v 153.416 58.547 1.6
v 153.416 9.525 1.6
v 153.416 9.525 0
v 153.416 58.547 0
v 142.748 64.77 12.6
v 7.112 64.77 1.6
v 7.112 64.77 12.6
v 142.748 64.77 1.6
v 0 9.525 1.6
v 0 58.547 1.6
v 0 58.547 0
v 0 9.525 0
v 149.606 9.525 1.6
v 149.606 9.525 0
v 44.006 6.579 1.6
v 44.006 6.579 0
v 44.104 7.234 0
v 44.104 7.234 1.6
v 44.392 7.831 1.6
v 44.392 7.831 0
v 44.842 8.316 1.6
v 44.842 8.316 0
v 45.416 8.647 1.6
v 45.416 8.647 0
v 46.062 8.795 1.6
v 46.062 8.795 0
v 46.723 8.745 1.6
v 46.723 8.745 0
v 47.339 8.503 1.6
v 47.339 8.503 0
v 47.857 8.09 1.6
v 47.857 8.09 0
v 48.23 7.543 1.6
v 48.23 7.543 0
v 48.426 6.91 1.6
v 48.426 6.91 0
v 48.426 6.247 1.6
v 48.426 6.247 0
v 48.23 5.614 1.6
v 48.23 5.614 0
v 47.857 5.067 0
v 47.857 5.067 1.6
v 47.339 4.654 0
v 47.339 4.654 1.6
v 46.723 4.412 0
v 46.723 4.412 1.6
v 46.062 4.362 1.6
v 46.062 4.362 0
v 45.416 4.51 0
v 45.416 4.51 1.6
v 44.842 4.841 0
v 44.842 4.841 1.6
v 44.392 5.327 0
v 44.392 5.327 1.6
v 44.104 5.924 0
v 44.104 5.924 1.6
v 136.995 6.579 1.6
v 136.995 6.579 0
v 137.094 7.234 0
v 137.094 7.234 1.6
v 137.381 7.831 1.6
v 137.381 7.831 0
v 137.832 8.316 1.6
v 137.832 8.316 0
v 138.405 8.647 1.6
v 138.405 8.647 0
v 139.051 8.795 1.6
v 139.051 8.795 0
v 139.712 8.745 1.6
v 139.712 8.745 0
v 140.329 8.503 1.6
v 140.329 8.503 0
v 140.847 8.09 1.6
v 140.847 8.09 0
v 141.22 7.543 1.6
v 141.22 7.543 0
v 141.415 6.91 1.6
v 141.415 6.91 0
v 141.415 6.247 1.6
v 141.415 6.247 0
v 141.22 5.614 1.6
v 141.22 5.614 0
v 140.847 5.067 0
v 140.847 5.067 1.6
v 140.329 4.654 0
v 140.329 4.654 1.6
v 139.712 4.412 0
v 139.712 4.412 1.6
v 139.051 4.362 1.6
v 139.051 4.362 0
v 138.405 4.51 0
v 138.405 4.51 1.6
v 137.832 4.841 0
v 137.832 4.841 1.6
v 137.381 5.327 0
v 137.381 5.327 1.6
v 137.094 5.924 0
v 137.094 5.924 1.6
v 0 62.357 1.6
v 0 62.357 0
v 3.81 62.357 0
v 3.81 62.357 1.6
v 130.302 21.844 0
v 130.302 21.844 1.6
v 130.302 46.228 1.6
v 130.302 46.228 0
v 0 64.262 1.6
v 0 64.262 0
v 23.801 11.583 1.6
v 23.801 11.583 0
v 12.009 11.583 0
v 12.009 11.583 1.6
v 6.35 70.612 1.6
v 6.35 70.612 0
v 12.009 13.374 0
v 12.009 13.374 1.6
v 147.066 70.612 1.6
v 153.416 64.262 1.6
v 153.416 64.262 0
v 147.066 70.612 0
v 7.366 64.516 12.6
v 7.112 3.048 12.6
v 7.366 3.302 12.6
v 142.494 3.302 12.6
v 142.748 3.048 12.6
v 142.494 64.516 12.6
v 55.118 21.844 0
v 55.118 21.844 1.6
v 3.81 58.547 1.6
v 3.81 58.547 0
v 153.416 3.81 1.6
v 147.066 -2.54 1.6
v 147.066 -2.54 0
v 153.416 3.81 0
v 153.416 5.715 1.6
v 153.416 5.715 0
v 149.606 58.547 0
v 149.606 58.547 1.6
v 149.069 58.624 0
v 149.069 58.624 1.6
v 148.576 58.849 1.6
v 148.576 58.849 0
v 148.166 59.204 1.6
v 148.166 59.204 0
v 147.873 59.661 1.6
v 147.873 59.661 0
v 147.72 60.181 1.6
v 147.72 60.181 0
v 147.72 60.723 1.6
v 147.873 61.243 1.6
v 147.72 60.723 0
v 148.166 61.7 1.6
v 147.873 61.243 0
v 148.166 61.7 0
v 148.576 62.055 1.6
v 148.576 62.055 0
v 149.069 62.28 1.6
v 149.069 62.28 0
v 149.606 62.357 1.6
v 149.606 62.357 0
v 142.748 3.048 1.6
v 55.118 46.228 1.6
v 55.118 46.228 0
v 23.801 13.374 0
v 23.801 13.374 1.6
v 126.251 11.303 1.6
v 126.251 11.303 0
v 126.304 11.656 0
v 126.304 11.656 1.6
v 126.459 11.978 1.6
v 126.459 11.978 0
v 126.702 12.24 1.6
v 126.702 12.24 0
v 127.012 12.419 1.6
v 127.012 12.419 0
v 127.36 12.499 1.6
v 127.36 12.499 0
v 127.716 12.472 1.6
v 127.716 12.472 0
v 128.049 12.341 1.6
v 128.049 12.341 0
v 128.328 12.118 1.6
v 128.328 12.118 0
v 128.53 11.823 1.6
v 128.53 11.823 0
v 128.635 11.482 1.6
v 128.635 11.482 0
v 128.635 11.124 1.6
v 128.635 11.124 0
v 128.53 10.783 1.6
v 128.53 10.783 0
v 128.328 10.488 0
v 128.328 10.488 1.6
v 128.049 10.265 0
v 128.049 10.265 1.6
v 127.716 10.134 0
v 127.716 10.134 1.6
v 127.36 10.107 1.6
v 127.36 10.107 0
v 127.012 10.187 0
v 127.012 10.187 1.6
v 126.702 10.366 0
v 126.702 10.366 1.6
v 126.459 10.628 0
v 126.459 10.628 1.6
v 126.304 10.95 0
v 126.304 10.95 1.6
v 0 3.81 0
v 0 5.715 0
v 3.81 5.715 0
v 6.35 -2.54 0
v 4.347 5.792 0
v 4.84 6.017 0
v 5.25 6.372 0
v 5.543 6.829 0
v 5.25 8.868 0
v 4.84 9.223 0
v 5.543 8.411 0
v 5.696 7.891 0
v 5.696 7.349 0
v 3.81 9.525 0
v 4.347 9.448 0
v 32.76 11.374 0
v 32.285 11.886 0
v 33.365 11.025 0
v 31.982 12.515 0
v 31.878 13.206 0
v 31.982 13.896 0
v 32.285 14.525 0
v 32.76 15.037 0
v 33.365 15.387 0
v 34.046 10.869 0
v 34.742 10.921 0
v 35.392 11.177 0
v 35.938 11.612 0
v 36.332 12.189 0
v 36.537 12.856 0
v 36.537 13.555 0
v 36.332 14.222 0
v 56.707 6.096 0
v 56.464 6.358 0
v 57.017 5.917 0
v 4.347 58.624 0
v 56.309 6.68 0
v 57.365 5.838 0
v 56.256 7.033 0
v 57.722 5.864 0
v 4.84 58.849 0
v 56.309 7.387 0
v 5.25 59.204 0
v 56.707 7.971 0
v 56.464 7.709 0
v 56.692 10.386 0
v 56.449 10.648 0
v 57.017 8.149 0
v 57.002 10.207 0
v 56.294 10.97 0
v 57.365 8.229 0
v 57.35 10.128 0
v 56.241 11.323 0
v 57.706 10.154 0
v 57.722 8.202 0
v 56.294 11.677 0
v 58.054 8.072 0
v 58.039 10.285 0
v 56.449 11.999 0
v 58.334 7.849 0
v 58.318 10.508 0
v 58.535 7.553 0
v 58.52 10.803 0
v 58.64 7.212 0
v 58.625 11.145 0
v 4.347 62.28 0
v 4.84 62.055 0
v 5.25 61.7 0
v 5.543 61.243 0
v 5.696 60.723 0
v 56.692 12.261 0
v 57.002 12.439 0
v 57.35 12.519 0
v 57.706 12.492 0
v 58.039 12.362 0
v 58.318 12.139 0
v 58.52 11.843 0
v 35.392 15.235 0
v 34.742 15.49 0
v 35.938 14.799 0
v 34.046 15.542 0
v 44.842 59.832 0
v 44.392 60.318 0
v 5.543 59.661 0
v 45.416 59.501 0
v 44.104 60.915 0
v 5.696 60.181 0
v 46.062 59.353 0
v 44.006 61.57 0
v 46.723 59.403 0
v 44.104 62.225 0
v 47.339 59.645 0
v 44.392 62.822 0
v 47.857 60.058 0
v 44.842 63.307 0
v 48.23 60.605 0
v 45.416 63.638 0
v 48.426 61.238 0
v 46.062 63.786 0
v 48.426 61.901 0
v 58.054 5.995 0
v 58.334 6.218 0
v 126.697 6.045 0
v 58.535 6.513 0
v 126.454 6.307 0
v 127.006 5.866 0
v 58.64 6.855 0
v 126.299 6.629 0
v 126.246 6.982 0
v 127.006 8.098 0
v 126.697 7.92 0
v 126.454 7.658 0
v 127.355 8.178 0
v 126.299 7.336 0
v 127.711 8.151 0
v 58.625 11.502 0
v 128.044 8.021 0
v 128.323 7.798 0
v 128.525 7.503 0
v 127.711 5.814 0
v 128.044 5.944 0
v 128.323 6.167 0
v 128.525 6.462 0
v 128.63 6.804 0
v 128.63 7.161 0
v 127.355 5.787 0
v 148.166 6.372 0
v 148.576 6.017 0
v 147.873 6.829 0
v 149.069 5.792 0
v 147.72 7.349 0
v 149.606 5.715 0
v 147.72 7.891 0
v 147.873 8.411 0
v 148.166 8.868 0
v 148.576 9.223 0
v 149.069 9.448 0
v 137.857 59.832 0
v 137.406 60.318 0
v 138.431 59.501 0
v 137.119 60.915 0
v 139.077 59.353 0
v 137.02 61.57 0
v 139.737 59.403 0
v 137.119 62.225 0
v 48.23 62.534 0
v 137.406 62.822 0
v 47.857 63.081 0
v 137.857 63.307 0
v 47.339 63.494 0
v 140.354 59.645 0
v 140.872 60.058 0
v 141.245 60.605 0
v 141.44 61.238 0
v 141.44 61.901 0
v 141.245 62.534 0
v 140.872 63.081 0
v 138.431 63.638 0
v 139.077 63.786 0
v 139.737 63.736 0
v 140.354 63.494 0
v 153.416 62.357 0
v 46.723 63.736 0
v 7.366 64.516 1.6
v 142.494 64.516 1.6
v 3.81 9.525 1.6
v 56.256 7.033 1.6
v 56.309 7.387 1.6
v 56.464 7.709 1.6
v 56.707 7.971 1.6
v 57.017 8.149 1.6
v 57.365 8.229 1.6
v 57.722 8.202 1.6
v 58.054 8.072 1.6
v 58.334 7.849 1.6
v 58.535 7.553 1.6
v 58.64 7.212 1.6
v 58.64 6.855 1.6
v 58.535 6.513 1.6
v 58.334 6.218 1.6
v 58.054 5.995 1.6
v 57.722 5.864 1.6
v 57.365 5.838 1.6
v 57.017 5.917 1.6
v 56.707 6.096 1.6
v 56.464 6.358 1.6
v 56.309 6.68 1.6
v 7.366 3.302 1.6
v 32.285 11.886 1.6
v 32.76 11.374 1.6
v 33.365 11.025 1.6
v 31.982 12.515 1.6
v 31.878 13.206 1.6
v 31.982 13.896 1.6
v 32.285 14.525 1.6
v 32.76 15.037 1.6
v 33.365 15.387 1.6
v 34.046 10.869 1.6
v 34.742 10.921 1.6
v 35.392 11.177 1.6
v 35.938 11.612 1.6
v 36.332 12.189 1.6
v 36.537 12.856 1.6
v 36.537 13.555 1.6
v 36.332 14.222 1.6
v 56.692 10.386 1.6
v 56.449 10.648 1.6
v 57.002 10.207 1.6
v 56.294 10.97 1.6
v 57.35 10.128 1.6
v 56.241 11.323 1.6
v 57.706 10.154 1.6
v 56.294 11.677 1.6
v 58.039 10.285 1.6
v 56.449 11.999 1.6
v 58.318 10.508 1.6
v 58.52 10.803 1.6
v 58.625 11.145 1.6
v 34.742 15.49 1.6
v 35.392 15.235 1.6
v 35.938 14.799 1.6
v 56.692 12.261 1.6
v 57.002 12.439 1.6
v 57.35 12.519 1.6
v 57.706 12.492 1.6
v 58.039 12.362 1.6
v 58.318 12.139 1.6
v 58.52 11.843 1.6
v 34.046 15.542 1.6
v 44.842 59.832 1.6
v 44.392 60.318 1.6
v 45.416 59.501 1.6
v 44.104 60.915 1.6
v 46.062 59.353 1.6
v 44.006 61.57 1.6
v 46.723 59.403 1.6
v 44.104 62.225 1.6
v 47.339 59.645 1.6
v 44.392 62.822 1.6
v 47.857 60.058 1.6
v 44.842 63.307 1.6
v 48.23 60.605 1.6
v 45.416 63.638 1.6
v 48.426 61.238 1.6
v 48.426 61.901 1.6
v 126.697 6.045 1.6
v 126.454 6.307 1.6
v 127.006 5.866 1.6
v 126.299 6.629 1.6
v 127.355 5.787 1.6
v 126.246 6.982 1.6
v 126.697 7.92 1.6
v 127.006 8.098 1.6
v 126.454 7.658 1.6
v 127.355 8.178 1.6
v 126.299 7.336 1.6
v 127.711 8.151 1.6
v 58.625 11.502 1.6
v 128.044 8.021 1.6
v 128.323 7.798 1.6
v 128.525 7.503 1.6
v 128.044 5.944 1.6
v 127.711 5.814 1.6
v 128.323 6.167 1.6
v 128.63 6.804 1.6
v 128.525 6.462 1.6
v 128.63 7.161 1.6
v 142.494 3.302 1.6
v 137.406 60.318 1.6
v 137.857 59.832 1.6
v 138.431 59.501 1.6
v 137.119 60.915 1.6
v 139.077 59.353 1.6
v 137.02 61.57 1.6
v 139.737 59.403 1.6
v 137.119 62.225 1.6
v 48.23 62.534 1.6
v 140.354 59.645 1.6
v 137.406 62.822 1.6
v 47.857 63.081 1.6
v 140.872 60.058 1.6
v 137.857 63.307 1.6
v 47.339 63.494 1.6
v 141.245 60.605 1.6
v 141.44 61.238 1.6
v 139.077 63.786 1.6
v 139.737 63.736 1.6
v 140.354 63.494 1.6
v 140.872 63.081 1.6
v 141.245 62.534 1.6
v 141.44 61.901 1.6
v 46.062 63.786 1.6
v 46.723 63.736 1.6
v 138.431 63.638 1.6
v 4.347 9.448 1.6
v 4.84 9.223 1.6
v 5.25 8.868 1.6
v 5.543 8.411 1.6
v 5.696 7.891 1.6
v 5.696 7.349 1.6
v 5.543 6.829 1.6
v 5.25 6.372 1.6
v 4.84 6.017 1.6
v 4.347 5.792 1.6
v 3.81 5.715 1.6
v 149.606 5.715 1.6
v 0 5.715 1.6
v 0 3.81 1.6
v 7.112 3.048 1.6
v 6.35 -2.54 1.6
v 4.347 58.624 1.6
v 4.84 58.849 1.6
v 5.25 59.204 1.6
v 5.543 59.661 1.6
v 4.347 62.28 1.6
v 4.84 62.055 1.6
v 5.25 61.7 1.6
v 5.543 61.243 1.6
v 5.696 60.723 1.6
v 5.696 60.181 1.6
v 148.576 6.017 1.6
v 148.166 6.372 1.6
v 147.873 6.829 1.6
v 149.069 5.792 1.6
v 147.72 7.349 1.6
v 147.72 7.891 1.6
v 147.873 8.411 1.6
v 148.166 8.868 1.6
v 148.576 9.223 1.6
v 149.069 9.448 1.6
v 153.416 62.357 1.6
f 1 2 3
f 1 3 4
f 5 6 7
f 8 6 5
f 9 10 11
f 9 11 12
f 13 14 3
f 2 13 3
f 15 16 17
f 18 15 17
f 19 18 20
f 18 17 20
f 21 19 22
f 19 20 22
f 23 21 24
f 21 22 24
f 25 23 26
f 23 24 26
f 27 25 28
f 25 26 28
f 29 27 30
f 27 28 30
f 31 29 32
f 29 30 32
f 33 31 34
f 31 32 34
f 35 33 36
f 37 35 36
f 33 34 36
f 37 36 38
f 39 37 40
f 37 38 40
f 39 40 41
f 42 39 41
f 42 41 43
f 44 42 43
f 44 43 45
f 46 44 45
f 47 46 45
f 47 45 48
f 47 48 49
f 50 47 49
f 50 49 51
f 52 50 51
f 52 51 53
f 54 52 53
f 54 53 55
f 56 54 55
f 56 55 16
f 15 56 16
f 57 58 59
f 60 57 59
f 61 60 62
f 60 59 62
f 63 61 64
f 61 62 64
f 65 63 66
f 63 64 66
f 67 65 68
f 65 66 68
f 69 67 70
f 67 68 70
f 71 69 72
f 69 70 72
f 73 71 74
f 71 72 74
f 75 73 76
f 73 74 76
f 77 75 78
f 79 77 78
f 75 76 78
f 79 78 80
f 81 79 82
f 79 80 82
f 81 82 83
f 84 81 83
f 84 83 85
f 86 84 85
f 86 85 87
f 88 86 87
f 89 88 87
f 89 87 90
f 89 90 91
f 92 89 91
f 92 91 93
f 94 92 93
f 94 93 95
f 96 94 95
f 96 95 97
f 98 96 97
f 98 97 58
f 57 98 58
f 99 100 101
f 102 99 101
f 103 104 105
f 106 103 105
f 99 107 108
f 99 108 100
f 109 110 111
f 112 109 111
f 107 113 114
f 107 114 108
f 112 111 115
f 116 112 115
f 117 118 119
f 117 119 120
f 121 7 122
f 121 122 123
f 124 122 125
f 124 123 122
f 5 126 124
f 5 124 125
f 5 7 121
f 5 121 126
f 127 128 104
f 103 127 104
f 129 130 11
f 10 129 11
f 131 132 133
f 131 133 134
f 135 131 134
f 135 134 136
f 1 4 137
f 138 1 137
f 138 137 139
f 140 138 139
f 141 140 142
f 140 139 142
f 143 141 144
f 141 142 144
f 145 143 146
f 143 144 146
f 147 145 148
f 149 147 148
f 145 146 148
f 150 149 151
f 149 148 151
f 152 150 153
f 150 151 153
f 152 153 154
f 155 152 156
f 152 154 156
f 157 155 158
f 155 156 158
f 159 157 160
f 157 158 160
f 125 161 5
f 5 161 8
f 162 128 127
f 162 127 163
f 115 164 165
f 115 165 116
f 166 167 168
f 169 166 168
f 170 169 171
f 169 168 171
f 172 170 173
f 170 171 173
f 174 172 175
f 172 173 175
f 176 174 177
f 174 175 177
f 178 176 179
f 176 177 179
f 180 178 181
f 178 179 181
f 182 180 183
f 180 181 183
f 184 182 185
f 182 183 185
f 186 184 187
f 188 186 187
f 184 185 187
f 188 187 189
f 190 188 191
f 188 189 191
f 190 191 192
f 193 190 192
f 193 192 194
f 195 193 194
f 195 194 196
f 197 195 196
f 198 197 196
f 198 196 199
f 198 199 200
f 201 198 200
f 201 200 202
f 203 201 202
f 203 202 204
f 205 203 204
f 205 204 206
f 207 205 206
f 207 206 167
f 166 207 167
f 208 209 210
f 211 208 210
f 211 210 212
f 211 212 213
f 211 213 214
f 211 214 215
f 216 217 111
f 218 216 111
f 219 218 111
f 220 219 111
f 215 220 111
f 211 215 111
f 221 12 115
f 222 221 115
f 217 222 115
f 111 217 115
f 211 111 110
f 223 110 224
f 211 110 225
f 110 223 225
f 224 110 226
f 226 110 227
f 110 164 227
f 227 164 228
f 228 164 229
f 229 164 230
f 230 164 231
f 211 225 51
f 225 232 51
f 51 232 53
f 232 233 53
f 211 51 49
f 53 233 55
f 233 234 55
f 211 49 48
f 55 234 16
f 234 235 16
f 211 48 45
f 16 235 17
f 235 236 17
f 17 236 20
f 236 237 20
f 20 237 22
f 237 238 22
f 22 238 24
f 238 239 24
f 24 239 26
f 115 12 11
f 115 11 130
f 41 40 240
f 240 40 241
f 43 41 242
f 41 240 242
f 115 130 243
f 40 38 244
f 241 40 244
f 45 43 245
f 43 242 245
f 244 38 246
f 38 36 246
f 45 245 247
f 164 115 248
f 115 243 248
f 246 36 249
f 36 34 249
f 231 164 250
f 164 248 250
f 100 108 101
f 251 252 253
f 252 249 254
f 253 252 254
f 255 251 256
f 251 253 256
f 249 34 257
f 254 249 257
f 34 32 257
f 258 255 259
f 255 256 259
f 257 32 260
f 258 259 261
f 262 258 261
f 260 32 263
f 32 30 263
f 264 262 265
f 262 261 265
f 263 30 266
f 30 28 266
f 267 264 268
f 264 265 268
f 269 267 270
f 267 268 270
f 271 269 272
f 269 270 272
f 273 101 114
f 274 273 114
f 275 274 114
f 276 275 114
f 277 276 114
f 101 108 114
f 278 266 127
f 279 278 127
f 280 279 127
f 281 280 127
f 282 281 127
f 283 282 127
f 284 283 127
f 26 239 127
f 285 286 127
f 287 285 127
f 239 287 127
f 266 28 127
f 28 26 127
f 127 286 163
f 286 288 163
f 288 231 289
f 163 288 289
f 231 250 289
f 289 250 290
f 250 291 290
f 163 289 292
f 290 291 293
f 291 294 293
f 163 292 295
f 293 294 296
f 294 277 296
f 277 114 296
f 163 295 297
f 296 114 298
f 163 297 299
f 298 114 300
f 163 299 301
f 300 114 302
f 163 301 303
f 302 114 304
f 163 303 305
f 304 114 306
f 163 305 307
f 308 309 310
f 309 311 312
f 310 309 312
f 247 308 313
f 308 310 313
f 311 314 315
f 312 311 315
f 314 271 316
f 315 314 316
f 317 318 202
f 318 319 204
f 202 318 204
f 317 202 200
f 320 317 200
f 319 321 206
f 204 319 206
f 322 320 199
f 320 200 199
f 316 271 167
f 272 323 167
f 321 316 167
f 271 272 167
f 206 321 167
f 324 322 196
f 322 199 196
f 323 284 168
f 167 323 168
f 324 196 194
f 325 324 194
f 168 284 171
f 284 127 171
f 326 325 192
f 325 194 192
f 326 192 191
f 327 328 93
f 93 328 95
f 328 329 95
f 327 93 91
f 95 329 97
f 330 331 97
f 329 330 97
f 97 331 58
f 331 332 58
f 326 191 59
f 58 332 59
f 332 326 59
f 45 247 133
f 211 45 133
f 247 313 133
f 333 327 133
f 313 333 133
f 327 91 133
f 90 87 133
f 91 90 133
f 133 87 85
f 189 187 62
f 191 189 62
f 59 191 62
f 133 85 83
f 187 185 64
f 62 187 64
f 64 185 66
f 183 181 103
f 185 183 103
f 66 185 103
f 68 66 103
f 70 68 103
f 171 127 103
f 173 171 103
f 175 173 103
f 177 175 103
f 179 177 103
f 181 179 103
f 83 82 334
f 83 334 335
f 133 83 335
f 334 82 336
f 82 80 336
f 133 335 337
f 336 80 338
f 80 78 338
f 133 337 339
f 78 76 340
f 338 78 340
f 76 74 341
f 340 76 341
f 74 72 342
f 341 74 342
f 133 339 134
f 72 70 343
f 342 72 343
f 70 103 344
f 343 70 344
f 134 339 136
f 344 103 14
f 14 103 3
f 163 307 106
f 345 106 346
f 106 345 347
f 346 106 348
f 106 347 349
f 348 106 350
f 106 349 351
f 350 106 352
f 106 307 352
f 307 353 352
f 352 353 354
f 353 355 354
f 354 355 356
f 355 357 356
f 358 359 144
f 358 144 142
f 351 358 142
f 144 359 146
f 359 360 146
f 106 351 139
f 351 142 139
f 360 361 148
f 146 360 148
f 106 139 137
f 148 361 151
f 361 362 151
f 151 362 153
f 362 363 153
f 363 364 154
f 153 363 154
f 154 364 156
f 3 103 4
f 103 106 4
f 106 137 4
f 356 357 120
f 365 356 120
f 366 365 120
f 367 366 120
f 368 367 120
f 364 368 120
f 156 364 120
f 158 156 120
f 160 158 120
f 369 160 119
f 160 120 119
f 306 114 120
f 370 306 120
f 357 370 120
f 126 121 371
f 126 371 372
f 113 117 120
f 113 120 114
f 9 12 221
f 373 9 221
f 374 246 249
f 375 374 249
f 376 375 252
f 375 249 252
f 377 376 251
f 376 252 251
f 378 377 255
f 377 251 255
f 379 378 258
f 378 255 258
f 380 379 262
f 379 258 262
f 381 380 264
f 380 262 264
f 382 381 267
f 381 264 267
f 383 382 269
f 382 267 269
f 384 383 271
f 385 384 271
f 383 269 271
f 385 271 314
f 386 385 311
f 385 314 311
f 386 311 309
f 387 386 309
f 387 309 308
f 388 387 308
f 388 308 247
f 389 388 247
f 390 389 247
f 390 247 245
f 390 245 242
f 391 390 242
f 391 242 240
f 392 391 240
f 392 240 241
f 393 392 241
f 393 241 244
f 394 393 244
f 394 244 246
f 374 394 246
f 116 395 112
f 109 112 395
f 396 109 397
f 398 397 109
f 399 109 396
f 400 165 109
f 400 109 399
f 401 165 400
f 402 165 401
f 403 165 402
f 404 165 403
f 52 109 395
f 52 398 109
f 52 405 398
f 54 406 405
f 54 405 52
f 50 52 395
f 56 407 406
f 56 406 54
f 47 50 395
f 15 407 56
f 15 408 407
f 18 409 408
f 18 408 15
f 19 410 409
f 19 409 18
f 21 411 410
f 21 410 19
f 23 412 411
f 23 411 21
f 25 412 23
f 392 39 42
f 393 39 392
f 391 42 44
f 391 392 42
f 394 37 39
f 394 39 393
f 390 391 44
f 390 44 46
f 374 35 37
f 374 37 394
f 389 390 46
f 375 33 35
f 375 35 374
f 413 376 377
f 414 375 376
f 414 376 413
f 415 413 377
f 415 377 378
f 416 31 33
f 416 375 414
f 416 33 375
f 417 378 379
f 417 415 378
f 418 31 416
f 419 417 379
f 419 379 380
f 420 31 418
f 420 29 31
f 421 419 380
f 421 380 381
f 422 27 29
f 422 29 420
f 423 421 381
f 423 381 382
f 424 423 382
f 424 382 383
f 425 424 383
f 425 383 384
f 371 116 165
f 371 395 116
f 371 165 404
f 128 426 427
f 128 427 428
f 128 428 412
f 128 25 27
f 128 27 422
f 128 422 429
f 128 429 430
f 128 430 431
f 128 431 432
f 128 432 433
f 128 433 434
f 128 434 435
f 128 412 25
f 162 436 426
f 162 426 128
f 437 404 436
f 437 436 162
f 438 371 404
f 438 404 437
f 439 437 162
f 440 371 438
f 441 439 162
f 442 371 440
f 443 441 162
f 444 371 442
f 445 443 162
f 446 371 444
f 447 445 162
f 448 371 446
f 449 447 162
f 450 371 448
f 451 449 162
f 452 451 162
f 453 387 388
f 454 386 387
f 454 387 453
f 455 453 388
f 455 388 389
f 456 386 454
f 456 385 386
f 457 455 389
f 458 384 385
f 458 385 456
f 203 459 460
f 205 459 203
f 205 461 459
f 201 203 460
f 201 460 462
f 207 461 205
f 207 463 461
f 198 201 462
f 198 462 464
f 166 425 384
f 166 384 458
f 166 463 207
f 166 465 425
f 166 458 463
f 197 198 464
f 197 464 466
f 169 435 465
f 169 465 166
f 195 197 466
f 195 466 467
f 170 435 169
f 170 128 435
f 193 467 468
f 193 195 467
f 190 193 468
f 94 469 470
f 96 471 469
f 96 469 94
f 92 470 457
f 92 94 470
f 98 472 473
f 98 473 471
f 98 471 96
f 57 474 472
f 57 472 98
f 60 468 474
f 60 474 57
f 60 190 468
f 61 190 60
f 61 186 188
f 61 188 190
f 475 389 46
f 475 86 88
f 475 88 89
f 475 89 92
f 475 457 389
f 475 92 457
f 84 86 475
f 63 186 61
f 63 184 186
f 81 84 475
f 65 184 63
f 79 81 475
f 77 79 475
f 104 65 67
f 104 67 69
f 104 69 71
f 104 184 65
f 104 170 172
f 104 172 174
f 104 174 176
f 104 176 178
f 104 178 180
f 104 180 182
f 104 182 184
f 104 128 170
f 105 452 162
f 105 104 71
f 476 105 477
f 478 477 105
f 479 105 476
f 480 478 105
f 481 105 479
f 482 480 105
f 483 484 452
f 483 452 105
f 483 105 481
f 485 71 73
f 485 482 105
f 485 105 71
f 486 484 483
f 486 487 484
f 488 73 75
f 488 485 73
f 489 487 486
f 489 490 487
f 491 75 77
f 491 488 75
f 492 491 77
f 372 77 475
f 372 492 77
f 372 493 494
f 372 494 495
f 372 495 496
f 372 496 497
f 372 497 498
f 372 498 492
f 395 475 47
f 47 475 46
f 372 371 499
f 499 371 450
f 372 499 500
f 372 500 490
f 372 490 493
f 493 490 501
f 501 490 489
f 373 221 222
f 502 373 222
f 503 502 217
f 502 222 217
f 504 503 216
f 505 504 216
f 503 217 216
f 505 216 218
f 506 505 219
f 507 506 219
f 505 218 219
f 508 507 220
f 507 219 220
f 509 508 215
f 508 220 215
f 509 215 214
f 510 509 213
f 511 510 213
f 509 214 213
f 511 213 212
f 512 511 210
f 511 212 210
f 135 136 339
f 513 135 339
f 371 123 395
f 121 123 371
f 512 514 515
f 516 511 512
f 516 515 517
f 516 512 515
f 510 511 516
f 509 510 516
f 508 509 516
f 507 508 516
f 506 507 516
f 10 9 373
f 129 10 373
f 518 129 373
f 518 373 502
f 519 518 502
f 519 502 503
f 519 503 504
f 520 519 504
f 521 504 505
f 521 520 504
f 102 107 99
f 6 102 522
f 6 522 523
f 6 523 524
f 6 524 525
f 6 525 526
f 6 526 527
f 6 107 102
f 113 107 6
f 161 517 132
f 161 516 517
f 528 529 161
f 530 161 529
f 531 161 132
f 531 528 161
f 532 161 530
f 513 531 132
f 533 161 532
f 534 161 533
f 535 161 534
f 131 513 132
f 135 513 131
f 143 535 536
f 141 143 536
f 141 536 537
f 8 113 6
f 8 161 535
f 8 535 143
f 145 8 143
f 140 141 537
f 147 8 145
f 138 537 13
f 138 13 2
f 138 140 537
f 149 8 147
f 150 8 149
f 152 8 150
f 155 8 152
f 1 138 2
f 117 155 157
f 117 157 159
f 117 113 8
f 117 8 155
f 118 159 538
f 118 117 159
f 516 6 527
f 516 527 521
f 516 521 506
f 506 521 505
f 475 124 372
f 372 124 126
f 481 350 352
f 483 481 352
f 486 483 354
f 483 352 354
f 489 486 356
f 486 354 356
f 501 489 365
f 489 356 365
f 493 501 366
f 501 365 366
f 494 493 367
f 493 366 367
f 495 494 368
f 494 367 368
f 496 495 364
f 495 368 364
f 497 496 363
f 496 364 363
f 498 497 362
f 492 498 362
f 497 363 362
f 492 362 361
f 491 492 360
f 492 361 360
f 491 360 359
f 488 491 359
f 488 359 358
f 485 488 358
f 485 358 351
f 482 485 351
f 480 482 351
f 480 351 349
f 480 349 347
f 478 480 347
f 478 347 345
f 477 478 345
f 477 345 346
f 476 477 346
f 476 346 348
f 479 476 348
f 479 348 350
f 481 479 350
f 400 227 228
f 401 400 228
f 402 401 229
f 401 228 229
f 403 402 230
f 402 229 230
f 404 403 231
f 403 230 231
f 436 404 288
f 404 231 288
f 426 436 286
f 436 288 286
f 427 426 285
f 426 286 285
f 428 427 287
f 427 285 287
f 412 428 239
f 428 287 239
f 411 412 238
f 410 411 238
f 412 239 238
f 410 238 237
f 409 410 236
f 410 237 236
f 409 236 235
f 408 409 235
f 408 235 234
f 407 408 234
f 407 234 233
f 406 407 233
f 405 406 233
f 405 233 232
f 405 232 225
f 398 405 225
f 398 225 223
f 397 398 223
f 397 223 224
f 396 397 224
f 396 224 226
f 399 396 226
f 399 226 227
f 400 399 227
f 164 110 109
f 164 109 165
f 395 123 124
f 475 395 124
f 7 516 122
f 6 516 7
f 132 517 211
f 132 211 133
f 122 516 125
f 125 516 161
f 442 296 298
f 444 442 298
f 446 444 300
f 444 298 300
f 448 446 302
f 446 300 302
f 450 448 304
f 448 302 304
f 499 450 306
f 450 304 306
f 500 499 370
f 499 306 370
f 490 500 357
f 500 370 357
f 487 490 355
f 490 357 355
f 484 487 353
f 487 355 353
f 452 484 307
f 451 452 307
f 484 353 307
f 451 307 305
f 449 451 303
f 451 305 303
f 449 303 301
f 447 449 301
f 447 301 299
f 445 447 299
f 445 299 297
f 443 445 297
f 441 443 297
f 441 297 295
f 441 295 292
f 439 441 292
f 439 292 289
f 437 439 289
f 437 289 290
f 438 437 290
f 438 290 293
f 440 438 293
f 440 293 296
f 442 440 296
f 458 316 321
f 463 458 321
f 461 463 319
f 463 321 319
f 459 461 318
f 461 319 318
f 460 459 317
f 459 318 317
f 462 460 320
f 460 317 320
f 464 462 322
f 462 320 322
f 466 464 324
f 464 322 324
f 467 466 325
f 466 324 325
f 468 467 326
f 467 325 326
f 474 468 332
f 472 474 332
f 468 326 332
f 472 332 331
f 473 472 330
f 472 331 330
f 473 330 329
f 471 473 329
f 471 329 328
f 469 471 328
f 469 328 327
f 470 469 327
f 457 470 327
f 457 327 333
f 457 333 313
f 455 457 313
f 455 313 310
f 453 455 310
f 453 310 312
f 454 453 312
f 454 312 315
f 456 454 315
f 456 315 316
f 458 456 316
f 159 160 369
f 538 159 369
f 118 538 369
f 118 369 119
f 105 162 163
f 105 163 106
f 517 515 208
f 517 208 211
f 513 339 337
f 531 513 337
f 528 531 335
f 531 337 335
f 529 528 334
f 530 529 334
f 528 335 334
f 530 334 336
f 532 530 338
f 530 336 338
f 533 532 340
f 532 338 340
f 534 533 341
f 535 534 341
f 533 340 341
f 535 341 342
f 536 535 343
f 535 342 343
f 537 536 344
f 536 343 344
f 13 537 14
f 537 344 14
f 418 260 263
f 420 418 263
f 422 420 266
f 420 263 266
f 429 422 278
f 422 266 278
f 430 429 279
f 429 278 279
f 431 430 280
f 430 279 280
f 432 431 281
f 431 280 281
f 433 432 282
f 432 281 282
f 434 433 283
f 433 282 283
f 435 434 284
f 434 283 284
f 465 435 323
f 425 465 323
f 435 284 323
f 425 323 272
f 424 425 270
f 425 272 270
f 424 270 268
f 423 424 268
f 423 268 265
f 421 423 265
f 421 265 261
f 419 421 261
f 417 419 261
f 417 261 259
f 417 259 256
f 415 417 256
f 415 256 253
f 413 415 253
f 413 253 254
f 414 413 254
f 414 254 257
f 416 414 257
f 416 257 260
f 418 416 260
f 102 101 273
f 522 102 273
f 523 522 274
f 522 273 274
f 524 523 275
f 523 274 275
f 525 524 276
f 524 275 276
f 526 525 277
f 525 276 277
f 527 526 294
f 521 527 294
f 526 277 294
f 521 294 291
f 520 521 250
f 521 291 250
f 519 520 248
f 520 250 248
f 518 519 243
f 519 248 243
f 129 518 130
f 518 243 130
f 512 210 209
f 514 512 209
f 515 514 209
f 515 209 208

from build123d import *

# Parameters (mm, degrees)
BOSS_EXTRUDE1_DEPTH  = 1.6002
CUT_EXTRUDE1_DEPTH   = 169.893706928
CUT_EXTRUDE2_DEPTH   = 169.893706928
CUT_EXTRUDE3_DEPTH   = 169.893706928
CUT_EXTRUDE4_DEPTH   = 169.893706928
SKETCH6_W            = 135.636
SKETCH6_H            = 61.722
BOSS_EXTRUDE2_DEPTH  = 11
SKETCH7_W            = 135.128
SKETCH7_H            = 61.214
CUT_EXTRUDE5_DEPTH   = 11
SKETCH8_W            = 75.184
SKETCH8_H            = 24.384
CUT_EXTRUDE6_DEPTH   = 170.243976555
SKETCH9_W            = 11.792676588
SKETCH9_H            = 1.790289347
CUT_EXTRUDE7_DEPTH   = 170.355509624
M2_CLEARANCE_HOLE1_D = 2.39776
M4_CLEARANCE_HOLE1_D = 4.445
M4_CLEARANCE_HOLE2_D = 4.68589235


with BuildPart() as part:
    # Sketch1 → Boss-Extrude1 (new body)
    with BuildSketch(Plane.XY.offset(1.6002)):
        Polygon((6.35, 70.612), (0, 64.262), (0, 3.81), (6.35, -2.54), (147.066, -2.54), (153.416, 3.81), (153.416, 64.262), (147.066, 70.612), align=None)
    extrude(amount=-BOSS_EXTRUDE1_DEPTH)

    # Sketch2 → Cut-Extrude1 (cut, through all)
    with BuildSketch(Plane(origin=(0, 0, 0), x_dir=(-1, 0, 0), z_dir=(0, 0, -1))):
        with BuildLine():
            Line((-153.416, 9.525), (-153.416, 5.715))
            Line((-153.416, 5.715), (-149.606, 5.715))
            ThreePointArc((-149.606, 5.715), (-147.701, 7.62), (-149.606, 9.525))
            Line((-149.606, 9.525), (-153.416, 9.525))
        make_face()
    extrude(amount=-CUT_EXTRUDE1_DEPTH, mode=Mode.SUBTRACT)

    # Sketch3 → Cut-Extrude2 (cut, through all)
    with BuildSketch(Plane(origin=(0, 0, 0), x_dir=(-1, 0, 0), z_dir=(0, 0, -1))):
        with BuildLine():
            Line((-153.416, 62.357), (-153.416, 58.547))
            Line((-153.416, 58.547), (-149.606, 58.547))
            ThreePointArc((-149.606, 58.547), (-147.701, 60.452), (-149.606, 62.357))
            Line((-149.606, 62.357), (-153.416, 62.357))
        make_face()
    extrude(amount=-CUT_EXTRUDE2_DEPTH, mode=Mode.SUBTRACT)

    # Sketch4 → Cut-Extrude3 (cut, through all)
    with BuildSketch(Plane(origin=(0, 0, 0), x_dir=(-1, 0, 0), z_dir=(0, 0, -1))):
        with BuildLine():
            Line((0, 58.547), (0, 62.357))
            Line((0, 62.357), (-3.81, 62.357))
            ThreePointArc((-3.81, 62.357), (-5.715, 60.452), (-3.81, 58.547))
            Line((-3.81, 58.547), (0, 58.547))
        make_face()
    extrude(amount=-CUT_EXTRUDE3_DEPTH, mode=Mode.SUBTRACT)

    # Sketch5 → Cut-Extrude4 (cut, through all)
    with BuildSketch(Plane(origin=(0, 0, 0), x_dir=(-1, 0, 0), z_dir=(0, 0, -1))):
        with BuildLine():
            Line((0, 5.715), (0, 9.525))
            Line((0, 9.525), (-3.81, 9.525))
            ThreePointArc((-3.81, 9.525), (-5.715, 7.62), (-3.81, 5.715))
            Line((-3.81, 5.715), (0, 5.715))
        make_face()
    extrude(amount=-CUT_EXTRUDE4_DEPTH, mode=Mode.SUBTRACT)

    # Sketch6 → Boss-Extrude2 (add)
    with BuildSketch(Plane.XY.offset(1.6002)):
        with Locations((74.93, 33.909)):
            Rectangle(SKETCH6_W, SKETCH6_H)
    extrude(amount=BOSS_EXTRUDE2_DEPTH)

    # Sketch7 → Cut-Extrude5 (cut)
    with BuildSketch(Plane.XY.offset(12.6002)):
        with Locations((74.93, 33.909)):
            Rectangle(SKETCH7_W, SKETCH7_H)
    extrude(amount=-CUT_EXTRUDE5_DEPTH, mode=Mode.SUBTRACT)

    # Sketch8 → Cut-Extrude6 (cut, through all)
    with BuildSketch(Plane.XY.offset(1.6002)):
        with Locations((92.71, 34.036)):
            Rectangle(SKETCH8_W, SKETCH8_H)
    extrude(amount=-CUT_EXTRUDE6_DEPTH, mode=Mode.SUBTRACT)

    # Sketch9 → Cut-Extrude7 (cut, through all)
    with BuildSketch(Plane(origin=(0, 0, 0), x_dir=(-1, 0, 0), z_dir=(0, 0, -1))):
        with Locations((-17.905053156, 12.47860787)):
            Rectangle(SKETCH9_W, SKETCH9_H)
    extrude(amount=-CUT_EXTRUDE7_DEPTH, mode=Mode.SUBTRACT)

    # M2 Clearance Hole1 (through all)
    with Locations(Plane.XY.offset(1.6002)):
        with Locations((127.4445, 6.98246), (127.44958, 11.303), (57.4548, 7.03326), (57.43956, 11.32332)):
            Hole(M2_CLEARANCE_HOLE1_D / 2)

    # M4 Clearance Hole1 (through all)
    with Locations(Plane.XY.offset(1.6002)):
        with Locations((46.228, 61.5696), (46.228, 6.5786), (139.2174, 6.5786), (139.2428, 61.5696)):
            Hole(M4_CLEARANCE_HOLE1_D / 2)

    # M4 Clearance Hole2 (through all)
    with Locations(Plane.XY.offset(1.6002)):
        with Locations((34.22065157, 13.205568935)):
            Hole(M4_CLEARANCE_HOLE2_D / 2)


solid = part.part
